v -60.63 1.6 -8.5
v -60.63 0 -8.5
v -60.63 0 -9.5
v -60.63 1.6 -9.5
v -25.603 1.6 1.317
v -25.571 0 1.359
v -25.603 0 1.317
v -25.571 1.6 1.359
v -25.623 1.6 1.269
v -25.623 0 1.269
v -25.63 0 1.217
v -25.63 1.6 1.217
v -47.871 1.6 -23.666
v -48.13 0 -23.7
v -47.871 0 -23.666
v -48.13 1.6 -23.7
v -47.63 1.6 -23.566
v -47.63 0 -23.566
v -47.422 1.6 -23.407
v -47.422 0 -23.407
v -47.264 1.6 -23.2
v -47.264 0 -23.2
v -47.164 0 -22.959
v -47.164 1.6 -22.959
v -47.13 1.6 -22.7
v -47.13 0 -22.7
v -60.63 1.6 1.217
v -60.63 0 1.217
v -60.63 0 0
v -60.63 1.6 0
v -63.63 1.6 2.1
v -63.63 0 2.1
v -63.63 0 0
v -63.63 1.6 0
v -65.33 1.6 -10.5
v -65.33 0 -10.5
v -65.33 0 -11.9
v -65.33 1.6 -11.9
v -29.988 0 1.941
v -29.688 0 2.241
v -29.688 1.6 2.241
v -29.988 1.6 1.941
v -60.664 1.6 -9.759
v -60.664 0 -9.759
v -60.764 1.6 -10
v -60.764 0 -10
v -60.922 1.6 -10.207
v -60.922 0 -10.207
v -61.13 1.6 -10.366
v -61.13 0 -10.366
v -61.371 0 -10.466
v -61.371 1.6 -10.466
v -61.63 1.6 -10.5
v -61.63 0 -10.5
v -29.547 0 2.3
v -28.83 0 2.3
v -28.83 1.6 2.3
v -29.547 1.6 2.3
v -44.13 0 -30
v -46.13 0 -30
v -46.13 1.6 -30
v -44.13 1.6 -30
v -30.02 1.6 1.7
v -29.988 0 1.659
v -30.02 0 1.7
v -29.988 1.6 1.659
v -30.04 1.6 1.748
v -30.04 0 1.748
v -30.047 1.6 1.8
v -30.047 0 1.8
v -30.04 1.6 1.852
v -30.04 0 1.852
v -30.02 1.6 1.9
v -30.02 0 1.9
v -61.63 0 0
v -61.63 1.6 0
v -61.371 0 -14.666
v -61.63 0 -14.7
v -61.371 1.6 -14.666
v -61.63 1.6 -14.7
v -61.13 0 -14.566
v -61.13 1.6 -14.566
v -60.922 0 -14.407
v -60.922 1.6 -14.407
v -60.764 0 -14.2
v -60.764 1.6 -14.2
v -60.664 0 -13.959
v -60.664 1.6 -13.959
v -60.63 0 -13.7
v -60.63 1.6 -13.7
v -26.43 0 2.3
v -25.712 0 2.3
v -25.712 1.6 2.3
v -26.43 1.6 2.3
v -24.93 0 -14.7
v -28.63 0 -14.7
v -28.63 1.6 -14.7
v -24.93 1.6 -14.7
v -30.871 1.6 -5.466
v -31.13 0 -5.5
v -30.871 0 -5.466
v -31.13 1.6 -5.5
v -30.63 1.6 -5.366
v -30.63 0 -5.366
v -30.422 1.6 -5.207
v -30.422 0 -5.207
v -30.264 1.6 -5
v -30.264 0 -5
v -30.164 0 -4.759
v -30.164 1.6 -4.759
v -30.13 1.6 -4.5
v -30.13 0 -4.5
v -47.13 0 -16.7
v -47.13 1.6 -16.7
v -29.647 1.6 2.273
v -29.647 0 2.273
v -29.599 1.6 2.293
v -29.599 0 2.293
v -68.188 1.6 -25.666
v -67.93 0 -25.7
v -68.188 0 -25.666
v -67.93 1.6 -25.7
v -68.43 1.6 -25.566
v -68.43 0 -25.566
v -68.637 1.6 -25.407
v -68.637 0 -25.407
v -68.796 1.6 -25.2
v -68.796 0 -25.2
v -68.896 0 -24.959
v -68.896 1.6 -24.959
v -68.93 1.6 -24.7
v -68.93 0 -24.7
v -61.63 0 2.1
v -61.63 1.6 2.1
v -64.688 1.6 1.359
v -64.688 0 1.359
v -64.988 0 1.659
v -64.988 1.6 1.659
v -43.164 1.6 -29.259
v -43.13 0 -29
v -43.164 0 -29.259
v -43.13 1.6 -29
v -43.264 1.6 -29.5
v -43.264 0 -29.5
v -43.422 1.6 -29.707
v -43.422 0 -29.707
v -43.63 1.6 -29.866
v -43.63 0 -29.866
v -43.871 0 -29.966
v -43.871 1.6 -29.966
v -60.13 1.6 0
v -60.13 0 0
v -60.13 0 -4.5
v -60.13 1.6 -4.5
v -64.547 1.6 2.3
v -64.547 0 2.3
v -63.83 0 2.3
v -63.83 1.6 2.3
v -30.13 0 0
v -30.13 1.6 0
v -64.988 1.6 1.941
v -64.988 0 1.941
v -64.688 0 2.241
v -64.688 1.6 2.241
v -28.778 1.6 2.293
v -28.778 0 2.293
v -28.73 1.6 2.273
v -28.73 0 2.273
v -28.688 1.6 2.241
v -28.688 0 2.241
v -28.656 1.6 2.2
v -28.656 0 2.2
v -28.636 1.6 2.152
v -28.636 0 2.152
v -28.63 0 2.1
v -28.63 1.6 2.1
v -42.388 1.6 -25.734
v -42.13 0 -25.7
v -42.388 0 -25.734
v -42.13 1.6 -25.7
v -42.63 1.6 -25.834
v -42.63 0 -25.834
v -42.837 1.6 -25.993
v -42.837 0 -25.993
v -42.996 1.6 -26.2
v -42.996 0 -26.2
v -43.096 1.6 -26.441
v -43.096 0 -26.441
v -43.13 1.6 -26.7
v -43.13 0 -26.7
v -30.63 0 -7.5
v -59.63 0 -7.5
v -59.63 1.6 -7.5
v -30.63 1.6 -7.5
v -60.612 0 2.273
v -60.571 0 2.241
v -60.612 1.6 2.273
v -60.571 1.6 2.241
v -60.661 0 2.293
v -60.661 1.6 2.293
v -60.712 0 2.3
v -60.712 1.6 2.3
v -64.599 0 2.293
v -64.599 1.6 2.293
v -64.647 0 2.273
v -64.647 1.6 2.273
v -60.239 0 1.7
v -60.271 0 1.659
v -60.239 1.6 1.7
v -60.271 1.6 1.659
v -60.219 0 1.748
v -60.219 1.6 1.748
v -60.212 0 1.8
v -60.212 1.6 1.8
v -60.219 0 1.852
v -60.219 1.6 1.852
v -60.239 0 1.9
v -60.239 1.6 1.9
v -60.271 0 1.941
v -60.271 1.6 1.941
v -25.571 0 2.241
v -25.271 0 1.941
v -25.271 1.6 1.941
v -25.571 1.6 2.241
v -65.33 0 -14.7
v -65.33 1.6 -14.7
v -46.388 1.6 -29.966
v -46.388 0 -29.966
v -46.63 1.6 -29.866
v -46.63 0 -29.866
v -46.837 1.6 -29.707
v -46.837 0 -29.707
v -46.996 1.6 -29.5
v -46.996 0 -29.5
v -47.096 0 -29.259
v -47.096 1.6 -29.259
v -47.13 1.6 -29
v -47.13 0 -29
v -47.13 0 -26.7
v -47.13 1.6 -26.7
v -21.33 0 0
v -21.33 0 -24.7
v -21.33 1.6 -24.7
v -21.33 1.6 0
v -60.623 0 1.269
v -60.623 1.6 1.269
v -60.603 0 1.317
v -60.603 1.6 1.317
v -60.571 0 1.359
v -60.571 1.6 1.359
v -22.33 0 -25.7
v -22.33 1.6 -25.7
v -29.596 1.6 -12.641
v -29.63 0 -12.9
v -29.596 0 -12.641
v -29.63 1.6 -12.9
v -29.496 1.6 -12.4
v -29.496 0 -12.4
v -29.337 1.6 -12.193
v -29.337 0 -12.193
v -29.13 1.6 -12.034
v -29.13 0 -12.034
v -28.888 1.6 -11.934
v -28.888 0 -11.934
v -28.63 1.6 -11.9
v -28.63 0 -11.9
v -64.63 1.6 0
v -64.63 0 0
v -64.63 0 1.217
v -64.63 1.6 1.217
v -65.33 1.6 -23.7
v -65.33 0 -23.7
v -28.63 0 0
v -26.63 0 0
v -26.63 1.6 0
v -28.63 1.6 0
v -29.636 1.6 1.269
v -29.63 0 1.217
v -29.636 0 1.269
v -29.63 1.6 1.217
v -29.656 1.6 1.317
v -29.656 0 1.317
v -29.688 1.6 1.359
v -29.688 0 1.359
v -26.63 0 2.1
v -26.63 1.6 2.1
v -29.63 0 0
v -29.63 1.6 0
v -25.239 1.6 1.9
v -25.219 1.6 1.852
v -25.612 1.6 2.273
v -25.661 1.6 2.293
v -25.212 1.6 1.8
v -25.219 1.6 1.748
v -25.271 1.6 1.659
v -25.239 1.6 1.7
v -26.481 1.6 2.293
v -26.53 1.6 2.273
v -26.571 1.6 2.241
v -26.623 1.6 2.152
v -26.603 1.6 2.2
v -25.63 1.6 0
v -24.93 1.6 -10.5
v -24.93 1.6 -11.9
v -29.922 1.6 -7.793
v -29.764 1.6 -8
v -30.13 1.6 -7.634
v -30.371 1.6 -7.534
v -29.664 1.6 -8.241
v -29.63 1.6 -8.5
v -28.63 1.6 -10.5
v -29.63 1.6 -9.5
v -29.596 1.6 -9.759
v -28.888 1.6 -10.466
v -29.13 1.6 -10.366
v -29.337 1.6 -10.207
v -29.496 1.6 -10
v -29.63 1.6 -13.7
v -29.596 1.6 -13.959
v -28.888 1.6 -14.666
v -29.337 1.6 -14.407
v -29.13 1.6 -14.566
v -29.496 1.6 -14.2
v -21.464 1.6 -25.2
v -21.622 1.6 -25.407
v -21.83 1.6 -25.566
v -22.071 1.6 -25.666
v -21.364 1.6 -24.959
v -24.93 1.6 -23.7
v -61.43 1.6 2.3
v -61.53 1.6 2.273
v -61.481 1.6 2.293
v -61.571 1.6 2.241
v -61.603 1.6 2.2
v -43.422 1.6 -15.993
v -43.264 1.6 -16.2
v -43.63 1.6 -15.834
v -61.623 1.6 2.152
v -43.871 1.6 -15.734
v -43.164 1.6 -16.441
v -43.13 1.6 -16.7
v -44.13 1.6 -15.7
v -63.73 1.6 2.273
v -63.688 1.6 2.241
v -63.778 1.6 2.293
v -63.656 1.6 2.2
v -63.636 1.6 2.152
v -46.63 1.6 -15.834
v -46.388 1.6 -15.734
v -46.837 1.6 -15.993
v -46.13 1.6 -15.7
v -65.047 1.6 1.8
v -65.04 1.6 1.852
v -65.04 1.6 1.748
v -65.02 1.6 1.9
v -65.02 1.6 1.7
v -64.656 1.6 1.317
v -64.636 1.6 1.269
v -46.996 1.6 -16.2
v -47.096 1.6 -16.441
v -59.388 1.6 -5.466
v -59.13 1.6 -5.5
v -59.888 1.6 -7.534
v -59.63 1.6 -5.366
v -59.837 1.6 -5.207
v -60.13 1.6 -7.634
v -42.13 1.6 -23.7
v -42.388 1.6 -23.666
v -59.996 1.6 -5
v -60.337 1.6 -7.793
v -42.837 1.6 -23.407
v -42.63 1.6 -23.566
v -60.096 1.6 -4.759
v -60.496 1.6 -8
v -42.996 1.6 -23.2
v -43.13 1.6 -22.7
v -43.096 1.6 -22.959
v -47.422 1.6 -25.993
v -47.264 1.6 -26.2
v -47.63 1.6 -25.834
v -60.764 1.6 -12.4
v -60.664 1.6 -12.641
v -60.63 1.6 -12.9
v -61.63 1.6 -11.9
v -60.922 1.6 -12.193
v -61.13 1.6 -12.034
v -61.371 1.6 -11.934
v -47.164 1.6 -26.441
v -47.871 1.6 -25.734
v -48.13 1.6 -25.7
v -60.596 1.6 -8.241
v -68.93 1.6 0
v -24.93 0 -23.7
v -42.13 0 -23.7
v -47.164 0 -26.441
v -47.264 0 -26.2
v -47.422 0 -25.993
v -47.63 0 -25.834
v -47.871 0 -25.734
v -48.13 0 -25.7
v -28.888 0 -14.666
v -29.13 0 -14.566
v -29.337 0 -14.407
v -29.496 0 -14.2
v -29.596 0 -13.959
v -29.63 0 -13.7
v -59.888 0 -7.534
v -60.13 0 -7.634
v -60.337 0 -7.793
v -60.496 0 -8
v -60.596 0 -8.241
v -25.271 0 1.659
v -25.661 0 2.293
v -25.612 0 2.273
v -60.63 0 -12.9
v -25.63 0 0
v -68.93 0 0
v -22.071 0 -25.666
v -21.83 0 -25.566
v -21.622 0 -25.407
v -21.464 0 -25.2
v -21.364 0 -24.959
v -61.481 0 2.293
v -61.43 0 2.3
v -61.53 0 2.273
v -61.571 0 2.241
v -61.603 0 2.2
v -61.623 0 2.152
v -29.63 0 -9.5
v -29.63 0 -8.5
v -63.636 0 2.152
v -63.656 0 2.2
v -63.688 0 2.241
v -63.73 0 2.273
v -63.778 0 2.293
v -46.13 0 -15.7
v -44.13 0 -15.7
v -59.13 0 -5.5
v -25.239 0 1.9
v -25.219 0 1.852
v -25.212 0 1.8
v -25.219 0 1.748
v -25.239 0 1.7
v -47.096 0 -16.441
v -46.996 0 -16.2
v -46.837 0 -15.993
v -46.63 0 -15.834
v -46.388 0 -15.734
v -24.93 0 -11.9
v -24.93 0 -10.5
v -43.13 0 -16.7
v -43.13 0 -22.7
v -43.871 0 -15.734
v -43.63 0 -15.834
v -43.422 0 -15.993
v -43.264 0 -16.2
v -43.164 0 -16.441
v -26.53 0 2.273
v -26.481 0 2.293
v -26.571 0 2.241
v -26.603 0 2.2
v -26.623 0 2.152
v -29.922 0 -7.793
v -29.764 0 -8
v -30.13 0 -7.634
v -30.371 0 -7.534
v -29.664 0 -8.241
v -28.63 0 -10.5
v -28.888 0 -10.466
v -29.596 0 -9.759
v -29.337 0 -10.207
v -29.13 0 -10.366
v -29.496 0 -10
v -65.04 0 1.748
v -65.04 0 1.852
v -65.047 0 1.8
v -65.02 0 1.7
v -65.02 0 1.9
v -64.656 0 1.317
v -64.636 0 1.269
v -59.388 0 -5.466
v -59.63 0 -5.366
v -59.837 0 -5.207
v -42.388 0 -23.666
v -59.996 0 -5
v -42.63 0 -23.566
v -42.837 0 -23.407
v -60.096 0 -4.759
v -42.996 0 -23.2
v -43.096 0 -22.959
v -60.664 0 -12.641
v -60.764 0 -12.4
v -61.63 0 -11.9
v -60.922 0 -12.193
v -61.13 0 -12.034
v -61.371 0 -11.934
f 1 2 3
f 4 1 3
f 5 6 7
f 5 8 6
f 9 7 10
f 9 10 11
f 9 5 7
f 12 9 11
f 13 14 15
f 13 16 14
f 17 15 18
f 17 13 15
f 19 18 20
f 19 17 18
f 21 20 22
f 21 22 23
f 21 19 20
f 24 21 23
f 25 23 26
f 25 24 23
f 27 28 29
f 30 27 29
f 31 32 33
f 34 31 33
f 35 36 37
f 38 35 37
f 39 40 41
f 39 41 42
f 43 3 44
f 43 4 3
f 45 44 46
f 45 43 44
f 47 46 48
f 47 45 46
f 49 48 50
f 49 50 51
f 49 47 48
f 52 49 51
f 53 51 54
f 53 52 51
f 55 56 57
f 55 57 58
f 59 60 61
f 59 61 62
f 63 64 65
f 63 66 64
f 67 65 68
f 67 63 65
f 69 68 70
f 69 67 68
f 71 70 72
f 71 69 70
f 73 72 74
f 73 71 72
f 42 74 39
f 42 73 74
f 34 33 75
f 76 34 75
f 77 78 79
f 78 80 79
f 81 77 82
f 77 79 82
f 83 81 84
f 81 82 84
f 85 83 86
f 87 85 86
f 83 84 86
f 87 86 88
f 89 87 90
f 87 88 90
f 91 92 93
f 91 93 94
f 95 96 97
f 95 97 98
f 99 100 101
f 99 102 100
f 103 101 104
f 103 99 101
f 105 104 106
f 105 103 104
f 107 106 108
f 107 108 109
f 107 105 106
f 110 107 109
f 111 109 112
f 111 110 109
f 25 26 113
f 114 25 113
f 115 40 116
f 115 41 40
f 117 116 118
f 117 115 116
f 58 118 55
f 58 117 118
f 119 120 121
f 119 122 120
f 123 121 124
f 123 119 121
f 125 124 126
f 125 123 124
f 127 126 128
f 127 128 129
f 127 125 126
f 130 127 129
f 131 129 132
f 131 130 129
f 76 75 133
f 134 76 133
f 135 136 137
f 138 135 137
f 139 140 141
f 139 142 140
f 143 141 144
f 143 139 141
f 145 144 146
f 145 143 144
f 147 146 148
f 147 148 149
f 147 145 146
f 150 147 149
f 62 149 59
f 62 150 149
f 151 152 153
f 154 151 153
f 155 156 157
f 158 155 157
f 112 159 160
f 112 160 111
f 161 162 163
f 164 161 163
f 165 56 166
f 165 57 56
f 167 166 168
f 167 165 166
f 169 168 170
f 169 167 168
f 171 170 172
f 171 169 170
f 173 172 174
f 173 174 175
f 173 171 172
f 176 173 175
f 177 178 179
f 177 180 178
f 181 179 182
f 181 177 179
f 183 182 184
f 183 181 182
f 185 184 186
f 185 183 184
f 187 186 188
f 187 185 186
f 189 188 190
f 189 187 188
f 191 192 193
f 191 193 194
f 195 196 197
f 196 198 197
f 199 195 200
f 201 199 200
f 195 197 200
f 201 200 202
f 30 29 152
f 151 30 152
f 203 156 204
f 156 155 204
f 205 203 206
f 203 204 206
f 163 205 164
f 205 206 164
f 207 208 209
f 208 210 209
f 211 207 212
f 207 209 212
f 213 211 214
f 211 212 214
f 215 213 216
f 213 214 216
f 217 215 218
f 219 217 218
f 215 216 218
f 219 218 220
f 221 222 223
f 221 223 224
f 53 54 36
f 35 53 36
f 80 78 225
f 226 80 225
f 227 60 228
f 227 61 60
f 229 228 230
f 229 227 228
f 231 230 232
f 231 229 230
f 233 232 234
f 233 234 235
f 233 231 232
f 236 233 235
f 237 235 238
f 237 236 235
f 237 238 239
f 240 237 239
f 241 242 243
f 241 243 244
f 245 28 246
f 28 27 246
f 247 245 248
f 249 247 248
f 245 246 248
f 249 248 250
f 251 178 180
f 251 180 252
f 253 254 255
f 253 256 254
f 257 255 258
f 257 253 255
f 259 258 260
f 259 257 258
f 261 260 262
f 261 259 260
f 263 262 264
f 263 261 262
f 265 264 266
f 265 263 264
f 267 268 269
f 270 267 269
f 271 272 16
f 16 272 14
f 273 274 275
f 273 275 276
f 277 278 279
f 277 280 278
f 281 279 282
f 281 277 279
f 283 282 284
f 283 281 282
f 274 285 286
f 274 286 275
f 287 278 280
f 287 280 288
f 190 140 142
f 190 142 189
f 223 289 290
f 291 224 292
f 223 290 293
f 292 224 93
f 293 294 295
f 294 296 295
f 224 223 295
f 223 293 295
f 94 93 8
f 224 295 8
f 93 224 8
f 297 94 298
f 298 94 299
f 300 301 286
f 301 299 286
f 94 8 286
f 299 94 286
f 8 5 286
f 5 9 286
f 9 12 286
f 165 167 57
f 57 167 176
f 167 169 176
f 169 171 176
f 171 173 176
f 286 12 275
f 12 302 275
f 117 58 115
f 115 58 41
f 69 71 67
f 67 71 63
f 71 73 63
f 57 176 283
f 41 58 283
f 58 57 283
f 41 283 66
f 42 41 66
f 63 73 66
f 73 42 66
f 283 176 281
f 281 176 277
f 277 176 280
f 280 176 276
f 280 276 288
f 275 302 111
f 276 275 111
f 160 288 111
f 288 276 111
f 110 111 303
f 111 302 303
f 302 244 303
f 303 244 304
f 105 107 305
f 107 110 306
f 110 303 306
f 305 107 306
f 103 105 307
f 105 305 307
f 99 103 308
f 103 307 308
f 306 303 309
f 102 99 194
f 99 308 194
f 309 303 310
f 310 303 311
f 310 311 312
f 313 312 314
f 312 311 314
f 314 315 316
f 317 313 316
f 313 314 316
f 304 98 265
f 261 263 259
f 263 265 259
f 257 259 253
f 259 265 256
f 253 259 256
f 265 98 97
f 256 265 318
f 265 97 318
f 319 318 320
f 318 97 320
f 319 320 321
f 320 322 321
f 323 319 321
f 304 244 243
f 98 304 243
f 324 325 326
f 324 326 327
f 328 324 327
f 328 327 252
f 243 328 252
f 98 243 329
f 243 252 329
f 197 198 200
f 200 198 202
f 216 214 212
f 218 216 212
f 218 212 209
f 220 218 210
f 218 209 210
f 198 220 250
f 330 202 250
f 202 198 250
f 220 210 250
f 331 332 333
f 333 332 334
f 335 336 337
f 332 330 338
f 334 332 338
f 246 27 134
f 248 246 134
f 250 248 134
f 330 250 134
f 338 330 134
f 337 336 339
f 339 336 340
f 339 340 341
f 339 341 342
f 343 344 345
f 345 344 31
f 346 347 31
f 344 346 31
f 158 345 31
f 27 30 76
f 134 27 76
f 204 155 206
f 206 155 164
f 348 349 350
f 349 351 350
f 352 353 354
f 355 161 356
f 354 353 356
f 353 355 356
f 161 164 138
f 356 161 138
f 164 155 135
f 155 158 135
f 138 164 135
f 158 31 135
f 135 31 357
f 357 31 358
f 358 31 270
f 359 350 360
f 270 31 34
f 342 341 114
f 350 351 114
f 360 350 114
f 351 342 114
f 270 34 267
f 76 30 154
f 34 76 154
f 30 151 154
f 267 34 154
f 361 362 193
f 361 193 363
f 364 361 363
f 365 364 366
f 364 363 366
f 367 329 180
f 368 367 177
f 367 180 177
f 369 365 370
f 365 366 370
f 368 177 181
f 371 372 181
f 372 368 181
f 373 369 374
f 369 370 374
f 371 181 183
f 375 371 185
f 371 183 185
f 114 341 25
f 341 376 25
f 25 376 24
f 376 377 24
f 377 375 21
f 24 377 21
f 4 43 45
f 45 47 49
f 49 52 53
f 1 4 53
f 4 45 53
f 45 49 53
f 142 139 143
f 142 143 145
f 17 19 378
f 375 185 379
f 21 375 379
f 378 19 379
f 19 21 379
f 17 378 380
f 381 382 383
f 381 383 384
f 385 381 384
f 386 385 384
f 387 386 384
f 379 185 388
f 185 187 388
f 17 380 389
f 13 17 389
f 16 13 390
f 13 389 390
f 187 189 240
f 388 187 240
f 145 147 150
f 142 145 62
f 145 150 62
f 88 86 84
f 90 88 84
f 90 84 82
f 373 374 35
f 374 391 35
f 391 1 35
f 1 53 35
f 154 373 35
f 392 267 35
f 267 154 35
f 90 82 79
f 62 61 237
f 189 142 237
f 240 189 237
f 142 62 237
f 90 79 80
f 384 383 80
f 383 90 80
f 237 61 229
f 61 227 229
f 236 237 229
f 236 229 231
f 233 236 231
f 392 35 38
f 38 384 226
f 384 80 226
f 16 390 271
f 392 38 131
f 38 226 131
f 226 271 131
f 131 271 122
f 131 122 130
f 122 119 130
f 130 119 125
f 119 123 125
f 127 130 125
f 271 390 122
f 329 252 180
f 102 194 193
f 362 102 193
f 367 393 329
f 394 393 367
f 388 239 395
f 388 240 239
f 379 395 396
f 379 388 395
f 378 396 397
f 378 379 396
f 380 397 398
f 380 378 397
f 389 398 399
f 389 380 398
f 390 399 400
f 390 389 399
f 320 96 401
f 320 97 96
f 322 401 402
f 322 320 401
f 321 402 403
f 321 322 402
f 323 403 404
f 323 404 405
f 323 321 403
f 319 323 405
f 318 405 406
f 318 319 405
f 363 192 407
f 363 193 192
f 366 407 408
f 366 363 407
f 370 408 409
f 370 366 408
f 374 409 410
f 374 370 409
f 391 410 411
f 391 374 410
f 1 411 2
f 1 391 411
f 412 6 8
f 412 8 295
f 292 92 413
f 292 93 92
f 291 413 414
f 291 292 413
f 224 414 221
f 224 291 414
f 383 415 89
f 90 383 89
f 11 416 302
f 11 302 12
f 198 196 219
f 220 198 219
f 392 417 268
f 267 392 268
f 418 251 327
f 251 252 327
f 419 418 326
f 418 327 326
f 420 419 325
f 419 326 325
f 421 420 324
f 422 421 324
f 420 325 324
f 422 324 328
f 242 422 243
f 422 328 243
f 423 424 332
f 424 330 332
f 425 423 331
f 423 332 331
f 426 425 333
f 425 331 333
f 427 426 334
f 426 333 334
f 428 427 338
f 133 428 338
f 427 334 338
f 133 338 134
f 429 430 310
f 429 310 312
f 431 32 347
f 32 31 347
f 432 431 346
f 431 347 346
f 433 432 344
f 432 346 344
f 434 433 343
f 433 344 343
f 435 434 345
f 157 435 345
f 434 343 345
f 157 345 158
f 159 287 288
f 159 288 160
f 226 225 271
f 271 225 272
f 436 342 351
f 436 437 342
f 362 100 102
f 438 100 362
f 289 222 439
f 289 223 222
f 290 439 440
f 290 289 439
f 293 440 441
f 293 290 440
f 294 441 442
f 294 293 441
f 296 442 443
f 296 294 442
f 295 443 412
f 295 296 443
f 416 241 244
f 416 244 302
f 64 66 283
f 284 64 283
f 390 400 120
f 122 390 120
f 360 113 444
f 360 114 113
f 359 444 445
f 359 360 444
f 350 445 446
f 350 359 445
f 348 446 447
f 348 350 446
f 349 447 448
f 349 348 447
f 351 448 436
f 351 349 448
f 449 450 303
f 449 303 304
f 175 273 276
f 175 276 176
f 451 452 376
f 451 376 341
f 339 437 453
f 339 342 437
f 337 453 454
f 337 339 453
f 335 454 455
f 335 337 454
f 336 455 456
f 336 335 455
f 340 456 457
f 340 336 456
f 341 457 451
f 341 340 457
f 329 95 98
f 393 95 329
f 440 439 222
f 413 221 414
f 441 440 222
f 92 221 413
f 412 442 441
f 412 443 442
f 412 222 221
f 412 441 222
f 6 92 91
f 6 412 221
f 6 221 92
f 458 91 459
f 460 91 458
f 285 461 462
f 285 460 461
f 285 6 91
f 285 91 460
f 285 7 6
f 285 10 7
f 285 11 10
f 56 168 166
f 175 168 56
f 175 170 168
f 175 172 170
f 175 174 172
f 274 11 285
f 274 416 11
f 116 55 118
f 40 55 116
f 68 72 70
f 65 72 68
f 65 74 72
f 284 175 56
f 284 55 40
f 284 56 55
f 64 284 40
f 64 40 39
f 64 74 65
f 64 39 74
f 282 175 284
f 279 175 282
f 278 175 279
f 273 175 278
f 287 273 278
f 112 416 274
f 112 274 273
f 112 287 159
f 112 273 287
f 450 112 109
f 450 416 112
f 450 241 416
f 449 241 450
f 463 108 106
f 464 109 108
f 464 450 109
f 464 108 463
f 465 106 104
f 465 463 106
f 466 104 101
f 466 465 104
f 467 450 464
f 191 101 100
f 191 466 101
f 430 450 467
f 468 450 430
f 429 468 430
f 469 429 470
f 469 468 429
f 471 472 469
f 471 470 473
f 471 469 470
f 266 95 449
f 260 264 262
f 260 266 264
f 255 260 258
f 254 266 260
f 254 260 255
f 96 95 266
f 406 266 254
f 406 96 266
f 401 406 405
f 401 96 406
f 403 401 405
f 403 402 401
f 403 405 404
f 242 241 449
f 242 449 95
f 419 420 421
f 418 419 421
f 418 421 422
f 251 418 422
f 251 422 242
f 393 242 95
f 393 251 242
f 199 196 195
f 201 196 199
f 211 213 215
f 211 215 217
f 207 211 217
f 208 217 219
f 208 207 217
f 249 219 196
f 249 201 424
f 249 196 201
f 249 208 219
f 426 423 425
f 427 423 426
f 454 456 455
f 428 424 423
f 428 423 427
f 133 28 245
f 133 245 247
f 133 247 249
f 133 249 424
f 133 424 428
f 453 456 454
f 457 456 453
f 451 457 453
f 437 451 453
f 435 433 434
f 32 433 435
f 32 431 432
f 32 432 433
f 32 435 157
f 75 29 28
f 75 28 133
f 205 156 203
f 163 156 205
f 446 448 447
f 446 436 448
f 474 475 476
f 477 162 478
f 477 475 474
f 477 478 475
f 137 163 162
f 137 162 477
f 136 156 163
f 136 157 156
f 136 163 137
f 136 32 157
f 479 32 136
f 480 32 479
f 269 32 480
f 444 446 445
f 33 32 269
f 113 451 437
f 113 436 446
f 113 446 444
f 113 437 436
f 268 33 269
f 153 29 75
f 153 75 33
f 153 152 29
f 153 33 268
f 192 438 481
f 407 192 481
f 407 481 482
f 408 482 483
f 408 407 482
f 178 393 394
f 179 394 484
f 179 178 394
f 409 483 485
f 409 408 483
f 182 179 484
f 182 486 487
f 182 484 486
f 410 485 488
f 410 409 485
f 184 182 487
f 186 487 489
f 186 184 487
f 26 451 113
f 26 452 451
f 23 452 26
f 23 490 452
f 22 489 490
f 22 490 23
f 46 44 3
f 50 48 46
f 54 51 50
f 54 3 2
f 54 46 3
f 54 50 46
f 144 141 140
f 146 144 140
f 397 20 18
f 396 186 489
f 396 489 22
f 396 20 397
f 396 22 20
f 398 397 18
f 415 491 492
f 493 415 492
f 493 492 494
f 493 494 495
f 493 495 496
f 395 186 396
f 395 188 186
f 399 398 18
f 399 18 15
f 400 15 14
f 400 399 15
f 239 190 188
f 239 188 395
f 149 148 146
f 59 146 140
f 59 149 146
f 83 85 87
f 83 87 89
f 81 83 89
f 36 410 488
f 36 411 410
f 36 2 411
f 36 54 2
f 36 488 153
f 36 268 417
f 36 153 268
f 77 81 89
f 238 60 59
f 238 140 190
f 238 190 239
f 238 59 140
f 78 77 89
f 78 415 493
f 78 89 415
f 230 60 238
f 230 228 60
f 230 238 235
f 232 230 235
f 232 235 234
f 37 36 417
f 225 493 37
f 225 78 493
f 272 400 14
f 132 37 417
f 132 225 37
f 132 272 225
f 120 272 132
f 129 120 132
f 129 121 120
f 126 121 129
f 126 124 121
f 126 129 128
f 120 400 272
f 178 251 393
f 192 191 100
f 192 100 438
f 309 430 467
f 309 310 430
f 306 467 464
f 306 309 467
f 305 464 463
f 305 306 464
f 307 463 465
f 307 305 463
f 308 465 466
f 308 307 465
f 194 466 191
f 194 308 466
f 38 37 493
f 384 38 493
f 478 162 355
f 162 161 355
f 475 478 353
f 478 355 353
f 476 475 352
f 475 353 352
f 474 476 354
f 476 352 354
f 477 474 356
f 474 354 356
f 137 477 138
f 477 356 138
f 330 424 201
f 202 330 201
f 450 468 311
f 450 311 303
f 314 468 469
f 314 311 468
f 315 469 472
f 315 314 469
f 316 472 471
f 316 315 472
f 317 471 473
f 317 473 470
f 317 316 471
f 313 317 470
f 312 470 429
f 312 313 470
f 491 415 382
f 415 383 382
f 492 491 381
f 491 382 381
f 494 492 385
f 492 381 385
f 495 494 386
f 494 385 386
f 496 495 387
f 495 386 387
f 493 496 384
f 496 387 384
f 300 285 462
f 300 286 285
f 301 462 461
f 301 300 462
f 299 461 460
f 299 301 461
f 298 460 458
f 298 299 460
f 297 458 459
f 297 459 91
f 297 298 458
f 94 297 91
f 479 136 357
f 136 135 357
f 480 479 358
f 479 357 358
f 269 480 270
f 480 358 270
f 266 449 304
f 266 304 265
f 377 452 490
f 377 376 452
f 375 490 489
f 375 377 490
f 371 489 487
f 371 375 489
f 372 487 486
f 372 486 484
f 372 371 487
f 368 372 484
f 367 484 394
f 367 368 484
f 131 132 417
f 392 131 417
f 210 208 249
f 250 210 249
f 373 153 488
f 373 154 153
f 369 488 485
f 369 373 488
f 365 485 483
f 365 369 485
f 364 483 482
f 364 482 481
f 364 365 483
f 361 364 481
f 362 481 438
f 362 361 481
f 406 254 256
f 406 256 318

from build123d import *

# Parameters (mm, degrees)
BOSS_EXTRUDE1_DEPTH = 1.6
FILLET1_R           = 1
FILLET2_R           = 1
FILLET3_R           = 0.2


with BuildPart() as part:
    # Sketch1 → Boss-Extrude1 (new body)
    with BuildSketch(Plane(origin=(0, 0, 0), x_dir=(1, 0, 0), z_dir=(0, 1, 0))):
        Polygon((-68.929583289, 0), (-64.629583289, 0), (-64.629583289, -1.3), (-65.129583289, -1.8), (-64.629583289, -2.3), (-63.629583289, -2.3), (-63.629583289, 0), (-61.629583289, 0), (-61.629583289, -2.3), (-60.629583289, -2.3), (-60.129583289, -1.8), (-60.629583289, -1.3), (-60.629583289, 0), (-60.129583289, 0), (-60.129583289, 5.5), (-45.129583289, 5.5), (-45.129583289, 7.5), (-60.629583289, 7.5), (-60.629583289, 10.5), (-65.329583289, 10.5), (-65.329583289, 11.9), (-60.629583289, 11.9), (-60.629583289, 14.7), (-65.329583289, 14.7), (-65.329583289, 23.7), (-47.129583289, 23.7), (-47.129583289, 15.7), (-45.129583289, 15.7), (-45.129583289, 30), (-47.129583289, 30), (-47.129583289, 25.7), (-68.929583289, 25.7), (-68.929583289, 20), align=None)
    boss_extrude1 = extrude(amount=BOSS_EXTRUDE1_DEPTH)

    # Mirror1: Boss-Extrude1 across plane
    add(boss_extrude1.mirror(Plane(origin=(-45.129583289, 1.6, -15.7), x_dir=(0, 0, 1), z_dir=(-1, 0, 0))))

    # Fillet1
    fillet1_edges = [part.edges().sort_by_distance(p)[0] for p in [
        (-68.929583289, 0.8, -25.7),
        (-47.129583289, 0.8, -25.7),
        (-47.129583289, 0.8, -30),
        (-47.129583289, 0.8, -15.7),
        (-47.129583289, 0.8, -23.7),
        (-21.329583289, 0.8, -25.7),
        (-43.129583289, 0.8, -25.7),
        (-43.129583289, 0.8, -30),
        (-43.129583289, 0.8, -15.7),
        (-43.129583289, 0.8, -23.7),
    ]]
    fillet(fillet1_edges, radius=FILLET1_R)

    # Fillet2
    fillet2_edges = [part.edges().sort_by_distance(p)[0] for p in [
        (-60.629583289, 0.8, -14.7),
        (-60.629583289, 0.8, -11.9),
        (-60.629583289, 0.8, -10.5),
        (-60.629583289, 0.8, -7.5),
        (-60.129583289, 0.8, -5.5),
        (-29.629583289, 0.8, -14.7),
        (-29.629583289, 0.8, -11.9),
        (-29.629583289, 0.8, -10.5),
        (-29.629583289, 0.8, -7.5),
        (-30.129583289, 0.8, -5.5),
    ]]
    fillet(fillet2_edges, radius=FILLET2_R)

    # Fillet3
    fillet3_edges = [part.edges().sort_by_distance(p)[0] for p in [
        (-60.629583289, 0.8, 1.3),
        (-60.129583289, 0.8, 1.8),
        (-60.629583289, 0.8, 2.3),
        (-61.629583289, 0.8, 2.3),
        (-63.629583289, 0.8, 2.3),
        (-64.629583289, 0.8, 2.3),
        (-65.129583289, 0.8, 1.8),
        (-64.629583289, 0.8, 1.3),
        (-29.629583289, 0.8, 1.3),
        (-30.129583289, 0.8, 1.8),
        (-29.629583289, 0.8, 2.3),
        (-28.629583289, 0.8, 2.3),
        (-26.629583289, 0.8, 2.3),
        (-25.629583289, 0.8, 2.3),
        (-25.129583289, 0.8, 1.8),
        (-25.629583289, 0.8, 1.3),
    ]]
    fillet(fillet3_edges, radius=FILLET3_R)


solid = part.part
